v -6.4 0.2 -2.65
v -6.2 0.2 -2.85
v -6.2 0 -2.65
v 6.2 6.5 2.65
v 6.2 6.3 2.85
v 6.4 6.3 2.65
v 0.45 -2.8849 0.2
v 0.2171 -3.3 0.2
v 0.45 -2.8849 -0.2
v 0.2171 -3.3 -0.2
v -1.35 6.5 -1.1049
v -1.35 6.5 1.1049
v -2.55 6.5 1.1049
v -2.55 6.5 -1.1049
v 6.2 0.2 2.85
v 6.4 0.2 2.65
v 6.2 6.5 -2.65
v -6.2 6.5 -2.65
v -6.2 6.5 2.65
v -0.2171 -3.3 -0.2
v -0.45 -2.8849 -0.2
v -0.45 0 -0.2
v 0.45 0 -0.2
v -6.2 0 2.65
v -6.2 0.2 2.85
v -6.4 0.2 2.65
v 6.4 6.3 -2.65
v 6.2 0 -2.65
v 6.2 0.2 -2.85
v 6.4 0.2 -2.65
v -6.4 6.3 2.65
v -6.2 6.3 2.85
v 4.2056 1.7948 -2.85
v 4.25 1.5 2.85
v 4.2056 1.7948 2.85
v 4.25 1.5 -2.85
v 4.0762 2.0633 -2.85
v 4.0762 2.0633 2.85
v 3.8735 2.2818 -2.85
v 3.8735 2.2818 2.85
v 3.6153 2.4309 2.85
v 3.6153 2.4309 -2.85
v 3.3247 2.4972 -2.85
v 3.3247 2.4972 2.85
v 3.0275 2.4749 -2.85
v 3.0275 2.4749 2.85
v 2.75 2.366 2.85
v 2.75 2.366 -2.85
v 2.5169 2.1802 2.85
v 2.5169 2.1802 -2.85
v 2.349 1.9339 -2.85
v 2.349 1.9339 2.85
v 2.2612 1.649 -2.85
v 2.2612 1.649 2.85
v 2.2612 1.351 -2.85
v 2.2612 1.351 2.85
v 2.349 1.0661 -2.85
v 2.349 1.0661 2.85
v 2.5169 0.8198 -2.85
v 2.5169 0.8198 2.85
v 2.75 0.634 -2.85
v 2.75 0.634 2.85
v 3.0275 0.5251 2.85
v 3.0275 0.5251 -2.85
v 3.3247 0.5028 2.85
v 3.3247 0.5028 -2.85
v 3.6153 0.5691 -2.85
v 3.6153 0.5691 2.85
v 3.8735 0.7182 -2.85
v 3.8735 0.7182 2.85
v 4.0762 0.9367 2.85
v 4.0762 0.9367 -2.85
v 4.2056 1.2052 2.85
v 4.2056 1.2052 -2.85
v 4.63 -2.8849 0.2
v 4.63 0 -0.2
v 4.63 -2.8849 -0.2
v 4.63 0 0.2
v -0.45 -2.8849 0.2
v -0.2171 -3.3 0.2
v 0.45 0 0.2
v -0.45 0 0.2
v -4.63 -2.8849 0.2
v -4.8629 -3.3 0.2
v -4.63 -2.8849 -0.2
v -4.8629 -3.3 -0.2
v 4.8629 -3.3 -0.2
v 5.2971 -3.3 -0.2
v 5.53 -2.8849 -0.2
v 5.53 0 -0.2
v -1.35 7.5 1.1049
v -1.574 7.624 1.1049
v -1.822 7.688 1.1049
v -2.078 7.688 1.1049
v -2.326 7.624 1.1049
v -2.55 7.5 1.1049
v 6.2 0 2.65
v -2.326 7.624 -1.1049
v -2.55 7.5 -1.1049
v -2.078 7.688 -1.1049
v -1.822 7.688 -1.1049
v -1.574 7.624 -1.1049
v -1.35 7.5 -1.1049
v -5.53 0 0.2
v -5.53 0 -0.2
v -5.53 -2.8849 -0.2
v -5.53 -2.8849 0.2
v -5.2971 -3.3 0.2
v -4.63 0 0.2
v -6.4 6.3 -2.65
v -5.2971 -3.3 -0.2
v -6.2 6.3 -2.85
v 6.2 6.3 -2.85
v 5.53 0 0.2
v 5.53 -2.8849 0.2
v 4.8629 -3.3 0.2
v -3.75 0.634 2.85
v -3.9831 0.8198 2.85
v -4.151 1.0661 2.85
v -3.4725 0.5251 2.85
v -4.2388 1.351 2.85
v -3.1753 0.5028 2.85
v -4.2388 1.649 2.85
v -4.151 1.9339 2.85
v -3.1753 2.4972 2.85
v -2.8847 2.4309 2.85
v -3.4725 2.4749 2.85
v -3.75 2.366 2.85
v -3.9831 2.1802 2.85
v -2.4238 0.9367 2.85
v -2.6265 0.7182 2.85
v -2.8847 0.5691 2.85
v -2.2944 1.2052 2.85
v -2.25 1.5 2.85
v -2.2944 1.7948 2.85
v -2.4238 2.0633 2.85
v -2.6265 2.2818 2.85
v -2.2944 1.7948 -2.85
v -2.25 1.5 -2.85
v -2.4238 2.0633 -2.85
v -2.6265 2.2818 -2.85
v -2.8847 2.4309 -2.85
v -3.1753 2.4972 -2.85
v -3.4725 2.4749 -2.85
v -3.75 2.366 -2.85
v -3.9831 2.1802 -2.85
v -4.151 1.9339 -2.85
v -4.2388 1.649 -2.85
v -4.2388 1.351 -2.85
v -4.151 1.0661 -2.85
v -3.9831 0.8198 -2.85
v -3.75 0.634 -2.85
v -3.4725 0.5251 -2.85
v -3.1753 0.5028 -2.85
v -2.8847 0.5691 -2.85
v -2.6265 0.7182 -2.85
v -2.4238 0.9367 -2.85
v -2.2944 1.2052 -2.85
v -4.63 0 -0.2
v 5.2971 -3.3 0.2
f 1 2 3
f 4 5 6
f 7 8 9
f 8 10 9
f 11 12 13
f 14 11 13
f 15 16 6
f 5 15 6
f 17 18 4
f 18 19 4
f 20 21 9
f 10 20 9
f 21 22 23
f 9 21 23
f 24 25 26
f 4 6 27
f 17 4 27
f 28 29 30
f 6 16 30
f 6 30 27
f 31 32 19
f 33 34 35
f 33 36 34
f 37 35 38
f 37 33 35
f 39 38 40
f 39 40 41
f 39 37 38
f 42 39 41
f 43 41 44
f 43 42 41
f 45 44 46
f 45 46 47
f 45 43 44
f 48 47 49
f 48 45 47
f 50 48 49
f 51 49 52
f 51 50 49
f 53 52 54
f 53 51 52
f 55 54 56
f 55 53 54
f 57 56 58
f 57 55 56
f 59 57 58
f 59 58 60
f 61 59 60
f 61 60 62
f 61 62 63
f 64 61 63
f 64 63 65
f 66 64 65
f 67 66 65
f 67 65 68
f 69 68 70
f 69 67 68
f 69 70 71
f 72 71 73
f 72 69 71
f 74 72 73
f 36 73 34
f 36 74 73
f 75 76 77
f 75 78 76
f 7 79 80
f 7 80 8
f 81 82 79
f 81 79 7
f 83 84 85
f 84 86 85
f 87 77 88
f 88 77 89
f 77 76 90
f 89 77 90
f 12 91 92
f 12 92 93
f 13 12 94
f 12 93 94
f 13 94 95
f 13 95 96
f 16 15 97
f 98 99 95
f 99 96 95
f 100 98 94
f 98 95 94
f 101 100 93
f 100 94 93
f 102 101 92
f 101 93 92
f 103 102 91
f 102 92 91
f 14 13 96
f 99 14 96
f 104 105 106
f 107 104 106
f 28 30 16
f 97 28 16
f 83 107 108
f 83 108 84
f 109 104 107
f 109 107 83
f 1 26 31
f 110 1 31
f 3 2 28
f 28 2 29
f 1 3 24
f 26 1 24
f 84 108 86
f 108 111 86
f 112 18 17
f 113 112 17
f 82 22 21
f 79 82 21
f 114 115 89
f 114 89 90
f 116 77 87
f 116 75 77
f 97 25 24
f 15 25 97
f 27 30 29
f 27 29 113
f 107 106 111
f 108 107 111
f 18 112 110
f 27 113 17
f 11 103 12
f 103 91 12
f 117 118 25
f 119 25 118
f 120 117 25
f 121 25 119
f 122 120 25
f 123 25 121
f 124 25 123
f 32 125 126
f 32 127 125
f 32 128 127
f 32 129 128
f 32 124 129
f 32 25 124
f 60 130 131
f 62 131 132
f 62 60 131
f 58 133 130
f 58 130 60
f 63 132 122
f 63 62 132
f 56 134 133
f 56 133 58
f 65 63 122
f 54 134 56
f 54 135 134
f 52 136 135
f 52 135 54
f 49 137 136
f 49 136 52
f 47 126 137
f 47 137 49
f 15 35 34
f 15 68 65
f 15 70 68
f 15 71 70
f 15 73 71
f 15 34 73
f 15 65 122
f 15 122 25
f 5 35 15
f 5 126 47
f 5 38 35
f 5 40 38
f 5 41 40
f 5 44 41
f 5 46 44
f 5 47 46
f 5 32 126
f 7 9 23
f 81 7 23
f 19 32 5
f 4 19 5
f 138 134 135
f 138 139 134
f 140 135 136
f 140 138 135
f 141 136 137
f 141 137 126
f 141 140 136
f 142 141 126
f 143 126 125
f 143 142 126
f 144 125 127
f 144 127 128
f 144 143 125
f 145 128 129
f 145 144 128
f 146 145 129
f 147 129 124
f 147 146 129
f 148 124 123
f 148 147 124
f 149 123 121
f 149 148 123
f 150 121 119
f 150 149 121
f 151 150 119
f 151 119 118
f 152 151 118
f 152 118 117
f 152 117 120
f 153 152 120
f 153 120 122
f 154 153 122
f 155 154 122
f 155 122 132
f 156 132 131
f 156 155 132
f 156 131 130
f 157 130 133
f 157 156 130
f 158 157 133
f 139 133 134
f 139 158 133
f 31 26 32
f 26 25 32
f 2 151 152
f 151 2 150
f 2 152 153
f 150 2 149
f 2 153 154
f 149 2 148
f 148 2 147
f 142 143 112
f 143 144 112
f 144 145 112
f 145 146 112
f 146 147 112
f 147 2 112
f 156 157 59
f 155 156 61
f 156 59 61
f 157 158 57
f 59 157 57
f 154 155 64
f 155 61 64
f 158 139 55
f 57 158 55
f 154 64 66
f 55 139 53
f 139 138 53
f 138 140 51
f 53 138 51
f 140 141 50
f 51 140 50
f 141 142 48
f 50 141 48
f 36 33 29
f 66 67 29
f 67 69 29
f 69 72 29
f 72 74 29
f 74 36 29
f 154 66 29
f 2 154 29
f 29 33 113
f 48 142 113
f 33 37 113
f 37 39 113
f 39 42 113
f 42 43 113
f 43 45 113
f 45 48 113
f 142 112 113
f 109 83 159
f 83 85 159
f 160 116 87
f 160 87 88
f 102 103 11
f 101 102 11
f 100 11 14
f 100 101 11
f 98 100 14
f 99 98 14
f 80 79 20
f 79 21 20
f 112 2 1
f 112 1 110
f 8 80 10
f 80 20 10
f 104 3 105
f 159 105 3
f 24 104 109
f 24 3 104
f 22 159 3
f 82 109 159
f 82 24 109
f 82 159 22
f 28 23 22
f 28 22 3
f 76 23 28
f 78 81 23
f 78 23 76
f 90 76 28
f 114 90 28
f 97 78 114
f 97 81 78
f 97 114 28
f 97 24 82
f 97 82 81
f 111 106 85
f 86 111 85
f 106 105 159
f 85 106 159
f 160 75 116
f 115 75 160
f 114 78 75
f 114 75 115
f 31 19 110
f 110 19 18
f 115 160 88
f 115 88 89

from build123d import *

# Parameters (mm, degrees)
SKETCH2_W           = 12.8
SKETCH2_H           = 6.5
SKETCH2_R           = 1
EXTRUDE1_DEPTH      = 2.85
EXTRUDE2_DEPTH      = 1.1049
BOSS_EXTRUDE2_DEPTH = 0.2
CHAMFER1_SIZE       = 0.2


with BuildPart() as part:
    # Sketch2 → Extrude1 (new body, symmetric)
    with BuildSketch(Plane.XY):
        with Locations((0, 3.25)):
            Rectangle(SKETCH2_W, SKETCH2_H)
        with Locations((3.25, 1.5)):
            Circle(SKETCH2_R, mode=Mode.SUBTRACT)
        with Locations((-3.25, 1.5)):
            Circle(SKETCH2_R, mode=Mode.SUBTRACT)
    extrude(amount=EXTRUDE1_DEPTH, both=True)

    # Sketch12 → Boss-Extrude2 (add, symmetric)
    with BuildSketch(Plane.XY):
        Polygon((-0.45, 0), (-0.45, -2.884856908), (-0.217069054, -3.3), (0.217069054, -3.3), (0.45, -2.884856908), (0.45, 0), align=None)
        Polygon((-5.53, -2.884856908), (-5.297069054, -3.3), (-4.862930946, -3.3), (-4.63, -2.884856908), (-4.63, 0), (-5.53, 0), align=None)
        Polygon((4.63, -2.884856908), (4.862930946, -3.3), (5.297069054, -3.3), (5.53, -2.884856908), (5.53, 0), (4.63, 0), align=None)
    extrude(amount=BOSS_EXTRUDE2_DEPTH, both=True)

    # Chamfer1
    chamfer1_edges = [part.edges().sort_by_distance(p)[0] for p in [
        (-6.4, 3.25, 2.85),
        (0, 0, 2.85),
        (6.4, 3.25, 2.85),
        (0, 0, -2.85),
        (-6.4, 3.25, -2.85),
        (0, 6.5, -2.85),
        (6.4, 3.25, -2.85),
        (0, 6.5, 2.85),
        (6.4, 0, 0),
        (-6.4, 0, 0),
        (-6.4, 6.5, 0),
        (6.4, 6.5, 0),
    ]]
    chamfer(chamfer1_edges, length=CHAMFER1_SIZE)


with BuildPart() as body_2:
    # Sketch3 → Extrude2 (new body, symmetric)
    with BuildSketch(Plane.XY):
        with BuildLine():
            Line((-2.55, 6.5), (-2.55, 7.5))
            ThreePointArc((-2.55, 7.5), (-1.95, 7.69608781), (-1.35, 7.5))
            Line((-1.35, 7.5), (-1.35, 6.5))
            Line((-1.35, 6.5), (-2.55, 6.5))
        make_face()
    extrude(amount=EXTRUDE2_DEPTH, both=True)


solid = Compound([part.part, body_2.part])
